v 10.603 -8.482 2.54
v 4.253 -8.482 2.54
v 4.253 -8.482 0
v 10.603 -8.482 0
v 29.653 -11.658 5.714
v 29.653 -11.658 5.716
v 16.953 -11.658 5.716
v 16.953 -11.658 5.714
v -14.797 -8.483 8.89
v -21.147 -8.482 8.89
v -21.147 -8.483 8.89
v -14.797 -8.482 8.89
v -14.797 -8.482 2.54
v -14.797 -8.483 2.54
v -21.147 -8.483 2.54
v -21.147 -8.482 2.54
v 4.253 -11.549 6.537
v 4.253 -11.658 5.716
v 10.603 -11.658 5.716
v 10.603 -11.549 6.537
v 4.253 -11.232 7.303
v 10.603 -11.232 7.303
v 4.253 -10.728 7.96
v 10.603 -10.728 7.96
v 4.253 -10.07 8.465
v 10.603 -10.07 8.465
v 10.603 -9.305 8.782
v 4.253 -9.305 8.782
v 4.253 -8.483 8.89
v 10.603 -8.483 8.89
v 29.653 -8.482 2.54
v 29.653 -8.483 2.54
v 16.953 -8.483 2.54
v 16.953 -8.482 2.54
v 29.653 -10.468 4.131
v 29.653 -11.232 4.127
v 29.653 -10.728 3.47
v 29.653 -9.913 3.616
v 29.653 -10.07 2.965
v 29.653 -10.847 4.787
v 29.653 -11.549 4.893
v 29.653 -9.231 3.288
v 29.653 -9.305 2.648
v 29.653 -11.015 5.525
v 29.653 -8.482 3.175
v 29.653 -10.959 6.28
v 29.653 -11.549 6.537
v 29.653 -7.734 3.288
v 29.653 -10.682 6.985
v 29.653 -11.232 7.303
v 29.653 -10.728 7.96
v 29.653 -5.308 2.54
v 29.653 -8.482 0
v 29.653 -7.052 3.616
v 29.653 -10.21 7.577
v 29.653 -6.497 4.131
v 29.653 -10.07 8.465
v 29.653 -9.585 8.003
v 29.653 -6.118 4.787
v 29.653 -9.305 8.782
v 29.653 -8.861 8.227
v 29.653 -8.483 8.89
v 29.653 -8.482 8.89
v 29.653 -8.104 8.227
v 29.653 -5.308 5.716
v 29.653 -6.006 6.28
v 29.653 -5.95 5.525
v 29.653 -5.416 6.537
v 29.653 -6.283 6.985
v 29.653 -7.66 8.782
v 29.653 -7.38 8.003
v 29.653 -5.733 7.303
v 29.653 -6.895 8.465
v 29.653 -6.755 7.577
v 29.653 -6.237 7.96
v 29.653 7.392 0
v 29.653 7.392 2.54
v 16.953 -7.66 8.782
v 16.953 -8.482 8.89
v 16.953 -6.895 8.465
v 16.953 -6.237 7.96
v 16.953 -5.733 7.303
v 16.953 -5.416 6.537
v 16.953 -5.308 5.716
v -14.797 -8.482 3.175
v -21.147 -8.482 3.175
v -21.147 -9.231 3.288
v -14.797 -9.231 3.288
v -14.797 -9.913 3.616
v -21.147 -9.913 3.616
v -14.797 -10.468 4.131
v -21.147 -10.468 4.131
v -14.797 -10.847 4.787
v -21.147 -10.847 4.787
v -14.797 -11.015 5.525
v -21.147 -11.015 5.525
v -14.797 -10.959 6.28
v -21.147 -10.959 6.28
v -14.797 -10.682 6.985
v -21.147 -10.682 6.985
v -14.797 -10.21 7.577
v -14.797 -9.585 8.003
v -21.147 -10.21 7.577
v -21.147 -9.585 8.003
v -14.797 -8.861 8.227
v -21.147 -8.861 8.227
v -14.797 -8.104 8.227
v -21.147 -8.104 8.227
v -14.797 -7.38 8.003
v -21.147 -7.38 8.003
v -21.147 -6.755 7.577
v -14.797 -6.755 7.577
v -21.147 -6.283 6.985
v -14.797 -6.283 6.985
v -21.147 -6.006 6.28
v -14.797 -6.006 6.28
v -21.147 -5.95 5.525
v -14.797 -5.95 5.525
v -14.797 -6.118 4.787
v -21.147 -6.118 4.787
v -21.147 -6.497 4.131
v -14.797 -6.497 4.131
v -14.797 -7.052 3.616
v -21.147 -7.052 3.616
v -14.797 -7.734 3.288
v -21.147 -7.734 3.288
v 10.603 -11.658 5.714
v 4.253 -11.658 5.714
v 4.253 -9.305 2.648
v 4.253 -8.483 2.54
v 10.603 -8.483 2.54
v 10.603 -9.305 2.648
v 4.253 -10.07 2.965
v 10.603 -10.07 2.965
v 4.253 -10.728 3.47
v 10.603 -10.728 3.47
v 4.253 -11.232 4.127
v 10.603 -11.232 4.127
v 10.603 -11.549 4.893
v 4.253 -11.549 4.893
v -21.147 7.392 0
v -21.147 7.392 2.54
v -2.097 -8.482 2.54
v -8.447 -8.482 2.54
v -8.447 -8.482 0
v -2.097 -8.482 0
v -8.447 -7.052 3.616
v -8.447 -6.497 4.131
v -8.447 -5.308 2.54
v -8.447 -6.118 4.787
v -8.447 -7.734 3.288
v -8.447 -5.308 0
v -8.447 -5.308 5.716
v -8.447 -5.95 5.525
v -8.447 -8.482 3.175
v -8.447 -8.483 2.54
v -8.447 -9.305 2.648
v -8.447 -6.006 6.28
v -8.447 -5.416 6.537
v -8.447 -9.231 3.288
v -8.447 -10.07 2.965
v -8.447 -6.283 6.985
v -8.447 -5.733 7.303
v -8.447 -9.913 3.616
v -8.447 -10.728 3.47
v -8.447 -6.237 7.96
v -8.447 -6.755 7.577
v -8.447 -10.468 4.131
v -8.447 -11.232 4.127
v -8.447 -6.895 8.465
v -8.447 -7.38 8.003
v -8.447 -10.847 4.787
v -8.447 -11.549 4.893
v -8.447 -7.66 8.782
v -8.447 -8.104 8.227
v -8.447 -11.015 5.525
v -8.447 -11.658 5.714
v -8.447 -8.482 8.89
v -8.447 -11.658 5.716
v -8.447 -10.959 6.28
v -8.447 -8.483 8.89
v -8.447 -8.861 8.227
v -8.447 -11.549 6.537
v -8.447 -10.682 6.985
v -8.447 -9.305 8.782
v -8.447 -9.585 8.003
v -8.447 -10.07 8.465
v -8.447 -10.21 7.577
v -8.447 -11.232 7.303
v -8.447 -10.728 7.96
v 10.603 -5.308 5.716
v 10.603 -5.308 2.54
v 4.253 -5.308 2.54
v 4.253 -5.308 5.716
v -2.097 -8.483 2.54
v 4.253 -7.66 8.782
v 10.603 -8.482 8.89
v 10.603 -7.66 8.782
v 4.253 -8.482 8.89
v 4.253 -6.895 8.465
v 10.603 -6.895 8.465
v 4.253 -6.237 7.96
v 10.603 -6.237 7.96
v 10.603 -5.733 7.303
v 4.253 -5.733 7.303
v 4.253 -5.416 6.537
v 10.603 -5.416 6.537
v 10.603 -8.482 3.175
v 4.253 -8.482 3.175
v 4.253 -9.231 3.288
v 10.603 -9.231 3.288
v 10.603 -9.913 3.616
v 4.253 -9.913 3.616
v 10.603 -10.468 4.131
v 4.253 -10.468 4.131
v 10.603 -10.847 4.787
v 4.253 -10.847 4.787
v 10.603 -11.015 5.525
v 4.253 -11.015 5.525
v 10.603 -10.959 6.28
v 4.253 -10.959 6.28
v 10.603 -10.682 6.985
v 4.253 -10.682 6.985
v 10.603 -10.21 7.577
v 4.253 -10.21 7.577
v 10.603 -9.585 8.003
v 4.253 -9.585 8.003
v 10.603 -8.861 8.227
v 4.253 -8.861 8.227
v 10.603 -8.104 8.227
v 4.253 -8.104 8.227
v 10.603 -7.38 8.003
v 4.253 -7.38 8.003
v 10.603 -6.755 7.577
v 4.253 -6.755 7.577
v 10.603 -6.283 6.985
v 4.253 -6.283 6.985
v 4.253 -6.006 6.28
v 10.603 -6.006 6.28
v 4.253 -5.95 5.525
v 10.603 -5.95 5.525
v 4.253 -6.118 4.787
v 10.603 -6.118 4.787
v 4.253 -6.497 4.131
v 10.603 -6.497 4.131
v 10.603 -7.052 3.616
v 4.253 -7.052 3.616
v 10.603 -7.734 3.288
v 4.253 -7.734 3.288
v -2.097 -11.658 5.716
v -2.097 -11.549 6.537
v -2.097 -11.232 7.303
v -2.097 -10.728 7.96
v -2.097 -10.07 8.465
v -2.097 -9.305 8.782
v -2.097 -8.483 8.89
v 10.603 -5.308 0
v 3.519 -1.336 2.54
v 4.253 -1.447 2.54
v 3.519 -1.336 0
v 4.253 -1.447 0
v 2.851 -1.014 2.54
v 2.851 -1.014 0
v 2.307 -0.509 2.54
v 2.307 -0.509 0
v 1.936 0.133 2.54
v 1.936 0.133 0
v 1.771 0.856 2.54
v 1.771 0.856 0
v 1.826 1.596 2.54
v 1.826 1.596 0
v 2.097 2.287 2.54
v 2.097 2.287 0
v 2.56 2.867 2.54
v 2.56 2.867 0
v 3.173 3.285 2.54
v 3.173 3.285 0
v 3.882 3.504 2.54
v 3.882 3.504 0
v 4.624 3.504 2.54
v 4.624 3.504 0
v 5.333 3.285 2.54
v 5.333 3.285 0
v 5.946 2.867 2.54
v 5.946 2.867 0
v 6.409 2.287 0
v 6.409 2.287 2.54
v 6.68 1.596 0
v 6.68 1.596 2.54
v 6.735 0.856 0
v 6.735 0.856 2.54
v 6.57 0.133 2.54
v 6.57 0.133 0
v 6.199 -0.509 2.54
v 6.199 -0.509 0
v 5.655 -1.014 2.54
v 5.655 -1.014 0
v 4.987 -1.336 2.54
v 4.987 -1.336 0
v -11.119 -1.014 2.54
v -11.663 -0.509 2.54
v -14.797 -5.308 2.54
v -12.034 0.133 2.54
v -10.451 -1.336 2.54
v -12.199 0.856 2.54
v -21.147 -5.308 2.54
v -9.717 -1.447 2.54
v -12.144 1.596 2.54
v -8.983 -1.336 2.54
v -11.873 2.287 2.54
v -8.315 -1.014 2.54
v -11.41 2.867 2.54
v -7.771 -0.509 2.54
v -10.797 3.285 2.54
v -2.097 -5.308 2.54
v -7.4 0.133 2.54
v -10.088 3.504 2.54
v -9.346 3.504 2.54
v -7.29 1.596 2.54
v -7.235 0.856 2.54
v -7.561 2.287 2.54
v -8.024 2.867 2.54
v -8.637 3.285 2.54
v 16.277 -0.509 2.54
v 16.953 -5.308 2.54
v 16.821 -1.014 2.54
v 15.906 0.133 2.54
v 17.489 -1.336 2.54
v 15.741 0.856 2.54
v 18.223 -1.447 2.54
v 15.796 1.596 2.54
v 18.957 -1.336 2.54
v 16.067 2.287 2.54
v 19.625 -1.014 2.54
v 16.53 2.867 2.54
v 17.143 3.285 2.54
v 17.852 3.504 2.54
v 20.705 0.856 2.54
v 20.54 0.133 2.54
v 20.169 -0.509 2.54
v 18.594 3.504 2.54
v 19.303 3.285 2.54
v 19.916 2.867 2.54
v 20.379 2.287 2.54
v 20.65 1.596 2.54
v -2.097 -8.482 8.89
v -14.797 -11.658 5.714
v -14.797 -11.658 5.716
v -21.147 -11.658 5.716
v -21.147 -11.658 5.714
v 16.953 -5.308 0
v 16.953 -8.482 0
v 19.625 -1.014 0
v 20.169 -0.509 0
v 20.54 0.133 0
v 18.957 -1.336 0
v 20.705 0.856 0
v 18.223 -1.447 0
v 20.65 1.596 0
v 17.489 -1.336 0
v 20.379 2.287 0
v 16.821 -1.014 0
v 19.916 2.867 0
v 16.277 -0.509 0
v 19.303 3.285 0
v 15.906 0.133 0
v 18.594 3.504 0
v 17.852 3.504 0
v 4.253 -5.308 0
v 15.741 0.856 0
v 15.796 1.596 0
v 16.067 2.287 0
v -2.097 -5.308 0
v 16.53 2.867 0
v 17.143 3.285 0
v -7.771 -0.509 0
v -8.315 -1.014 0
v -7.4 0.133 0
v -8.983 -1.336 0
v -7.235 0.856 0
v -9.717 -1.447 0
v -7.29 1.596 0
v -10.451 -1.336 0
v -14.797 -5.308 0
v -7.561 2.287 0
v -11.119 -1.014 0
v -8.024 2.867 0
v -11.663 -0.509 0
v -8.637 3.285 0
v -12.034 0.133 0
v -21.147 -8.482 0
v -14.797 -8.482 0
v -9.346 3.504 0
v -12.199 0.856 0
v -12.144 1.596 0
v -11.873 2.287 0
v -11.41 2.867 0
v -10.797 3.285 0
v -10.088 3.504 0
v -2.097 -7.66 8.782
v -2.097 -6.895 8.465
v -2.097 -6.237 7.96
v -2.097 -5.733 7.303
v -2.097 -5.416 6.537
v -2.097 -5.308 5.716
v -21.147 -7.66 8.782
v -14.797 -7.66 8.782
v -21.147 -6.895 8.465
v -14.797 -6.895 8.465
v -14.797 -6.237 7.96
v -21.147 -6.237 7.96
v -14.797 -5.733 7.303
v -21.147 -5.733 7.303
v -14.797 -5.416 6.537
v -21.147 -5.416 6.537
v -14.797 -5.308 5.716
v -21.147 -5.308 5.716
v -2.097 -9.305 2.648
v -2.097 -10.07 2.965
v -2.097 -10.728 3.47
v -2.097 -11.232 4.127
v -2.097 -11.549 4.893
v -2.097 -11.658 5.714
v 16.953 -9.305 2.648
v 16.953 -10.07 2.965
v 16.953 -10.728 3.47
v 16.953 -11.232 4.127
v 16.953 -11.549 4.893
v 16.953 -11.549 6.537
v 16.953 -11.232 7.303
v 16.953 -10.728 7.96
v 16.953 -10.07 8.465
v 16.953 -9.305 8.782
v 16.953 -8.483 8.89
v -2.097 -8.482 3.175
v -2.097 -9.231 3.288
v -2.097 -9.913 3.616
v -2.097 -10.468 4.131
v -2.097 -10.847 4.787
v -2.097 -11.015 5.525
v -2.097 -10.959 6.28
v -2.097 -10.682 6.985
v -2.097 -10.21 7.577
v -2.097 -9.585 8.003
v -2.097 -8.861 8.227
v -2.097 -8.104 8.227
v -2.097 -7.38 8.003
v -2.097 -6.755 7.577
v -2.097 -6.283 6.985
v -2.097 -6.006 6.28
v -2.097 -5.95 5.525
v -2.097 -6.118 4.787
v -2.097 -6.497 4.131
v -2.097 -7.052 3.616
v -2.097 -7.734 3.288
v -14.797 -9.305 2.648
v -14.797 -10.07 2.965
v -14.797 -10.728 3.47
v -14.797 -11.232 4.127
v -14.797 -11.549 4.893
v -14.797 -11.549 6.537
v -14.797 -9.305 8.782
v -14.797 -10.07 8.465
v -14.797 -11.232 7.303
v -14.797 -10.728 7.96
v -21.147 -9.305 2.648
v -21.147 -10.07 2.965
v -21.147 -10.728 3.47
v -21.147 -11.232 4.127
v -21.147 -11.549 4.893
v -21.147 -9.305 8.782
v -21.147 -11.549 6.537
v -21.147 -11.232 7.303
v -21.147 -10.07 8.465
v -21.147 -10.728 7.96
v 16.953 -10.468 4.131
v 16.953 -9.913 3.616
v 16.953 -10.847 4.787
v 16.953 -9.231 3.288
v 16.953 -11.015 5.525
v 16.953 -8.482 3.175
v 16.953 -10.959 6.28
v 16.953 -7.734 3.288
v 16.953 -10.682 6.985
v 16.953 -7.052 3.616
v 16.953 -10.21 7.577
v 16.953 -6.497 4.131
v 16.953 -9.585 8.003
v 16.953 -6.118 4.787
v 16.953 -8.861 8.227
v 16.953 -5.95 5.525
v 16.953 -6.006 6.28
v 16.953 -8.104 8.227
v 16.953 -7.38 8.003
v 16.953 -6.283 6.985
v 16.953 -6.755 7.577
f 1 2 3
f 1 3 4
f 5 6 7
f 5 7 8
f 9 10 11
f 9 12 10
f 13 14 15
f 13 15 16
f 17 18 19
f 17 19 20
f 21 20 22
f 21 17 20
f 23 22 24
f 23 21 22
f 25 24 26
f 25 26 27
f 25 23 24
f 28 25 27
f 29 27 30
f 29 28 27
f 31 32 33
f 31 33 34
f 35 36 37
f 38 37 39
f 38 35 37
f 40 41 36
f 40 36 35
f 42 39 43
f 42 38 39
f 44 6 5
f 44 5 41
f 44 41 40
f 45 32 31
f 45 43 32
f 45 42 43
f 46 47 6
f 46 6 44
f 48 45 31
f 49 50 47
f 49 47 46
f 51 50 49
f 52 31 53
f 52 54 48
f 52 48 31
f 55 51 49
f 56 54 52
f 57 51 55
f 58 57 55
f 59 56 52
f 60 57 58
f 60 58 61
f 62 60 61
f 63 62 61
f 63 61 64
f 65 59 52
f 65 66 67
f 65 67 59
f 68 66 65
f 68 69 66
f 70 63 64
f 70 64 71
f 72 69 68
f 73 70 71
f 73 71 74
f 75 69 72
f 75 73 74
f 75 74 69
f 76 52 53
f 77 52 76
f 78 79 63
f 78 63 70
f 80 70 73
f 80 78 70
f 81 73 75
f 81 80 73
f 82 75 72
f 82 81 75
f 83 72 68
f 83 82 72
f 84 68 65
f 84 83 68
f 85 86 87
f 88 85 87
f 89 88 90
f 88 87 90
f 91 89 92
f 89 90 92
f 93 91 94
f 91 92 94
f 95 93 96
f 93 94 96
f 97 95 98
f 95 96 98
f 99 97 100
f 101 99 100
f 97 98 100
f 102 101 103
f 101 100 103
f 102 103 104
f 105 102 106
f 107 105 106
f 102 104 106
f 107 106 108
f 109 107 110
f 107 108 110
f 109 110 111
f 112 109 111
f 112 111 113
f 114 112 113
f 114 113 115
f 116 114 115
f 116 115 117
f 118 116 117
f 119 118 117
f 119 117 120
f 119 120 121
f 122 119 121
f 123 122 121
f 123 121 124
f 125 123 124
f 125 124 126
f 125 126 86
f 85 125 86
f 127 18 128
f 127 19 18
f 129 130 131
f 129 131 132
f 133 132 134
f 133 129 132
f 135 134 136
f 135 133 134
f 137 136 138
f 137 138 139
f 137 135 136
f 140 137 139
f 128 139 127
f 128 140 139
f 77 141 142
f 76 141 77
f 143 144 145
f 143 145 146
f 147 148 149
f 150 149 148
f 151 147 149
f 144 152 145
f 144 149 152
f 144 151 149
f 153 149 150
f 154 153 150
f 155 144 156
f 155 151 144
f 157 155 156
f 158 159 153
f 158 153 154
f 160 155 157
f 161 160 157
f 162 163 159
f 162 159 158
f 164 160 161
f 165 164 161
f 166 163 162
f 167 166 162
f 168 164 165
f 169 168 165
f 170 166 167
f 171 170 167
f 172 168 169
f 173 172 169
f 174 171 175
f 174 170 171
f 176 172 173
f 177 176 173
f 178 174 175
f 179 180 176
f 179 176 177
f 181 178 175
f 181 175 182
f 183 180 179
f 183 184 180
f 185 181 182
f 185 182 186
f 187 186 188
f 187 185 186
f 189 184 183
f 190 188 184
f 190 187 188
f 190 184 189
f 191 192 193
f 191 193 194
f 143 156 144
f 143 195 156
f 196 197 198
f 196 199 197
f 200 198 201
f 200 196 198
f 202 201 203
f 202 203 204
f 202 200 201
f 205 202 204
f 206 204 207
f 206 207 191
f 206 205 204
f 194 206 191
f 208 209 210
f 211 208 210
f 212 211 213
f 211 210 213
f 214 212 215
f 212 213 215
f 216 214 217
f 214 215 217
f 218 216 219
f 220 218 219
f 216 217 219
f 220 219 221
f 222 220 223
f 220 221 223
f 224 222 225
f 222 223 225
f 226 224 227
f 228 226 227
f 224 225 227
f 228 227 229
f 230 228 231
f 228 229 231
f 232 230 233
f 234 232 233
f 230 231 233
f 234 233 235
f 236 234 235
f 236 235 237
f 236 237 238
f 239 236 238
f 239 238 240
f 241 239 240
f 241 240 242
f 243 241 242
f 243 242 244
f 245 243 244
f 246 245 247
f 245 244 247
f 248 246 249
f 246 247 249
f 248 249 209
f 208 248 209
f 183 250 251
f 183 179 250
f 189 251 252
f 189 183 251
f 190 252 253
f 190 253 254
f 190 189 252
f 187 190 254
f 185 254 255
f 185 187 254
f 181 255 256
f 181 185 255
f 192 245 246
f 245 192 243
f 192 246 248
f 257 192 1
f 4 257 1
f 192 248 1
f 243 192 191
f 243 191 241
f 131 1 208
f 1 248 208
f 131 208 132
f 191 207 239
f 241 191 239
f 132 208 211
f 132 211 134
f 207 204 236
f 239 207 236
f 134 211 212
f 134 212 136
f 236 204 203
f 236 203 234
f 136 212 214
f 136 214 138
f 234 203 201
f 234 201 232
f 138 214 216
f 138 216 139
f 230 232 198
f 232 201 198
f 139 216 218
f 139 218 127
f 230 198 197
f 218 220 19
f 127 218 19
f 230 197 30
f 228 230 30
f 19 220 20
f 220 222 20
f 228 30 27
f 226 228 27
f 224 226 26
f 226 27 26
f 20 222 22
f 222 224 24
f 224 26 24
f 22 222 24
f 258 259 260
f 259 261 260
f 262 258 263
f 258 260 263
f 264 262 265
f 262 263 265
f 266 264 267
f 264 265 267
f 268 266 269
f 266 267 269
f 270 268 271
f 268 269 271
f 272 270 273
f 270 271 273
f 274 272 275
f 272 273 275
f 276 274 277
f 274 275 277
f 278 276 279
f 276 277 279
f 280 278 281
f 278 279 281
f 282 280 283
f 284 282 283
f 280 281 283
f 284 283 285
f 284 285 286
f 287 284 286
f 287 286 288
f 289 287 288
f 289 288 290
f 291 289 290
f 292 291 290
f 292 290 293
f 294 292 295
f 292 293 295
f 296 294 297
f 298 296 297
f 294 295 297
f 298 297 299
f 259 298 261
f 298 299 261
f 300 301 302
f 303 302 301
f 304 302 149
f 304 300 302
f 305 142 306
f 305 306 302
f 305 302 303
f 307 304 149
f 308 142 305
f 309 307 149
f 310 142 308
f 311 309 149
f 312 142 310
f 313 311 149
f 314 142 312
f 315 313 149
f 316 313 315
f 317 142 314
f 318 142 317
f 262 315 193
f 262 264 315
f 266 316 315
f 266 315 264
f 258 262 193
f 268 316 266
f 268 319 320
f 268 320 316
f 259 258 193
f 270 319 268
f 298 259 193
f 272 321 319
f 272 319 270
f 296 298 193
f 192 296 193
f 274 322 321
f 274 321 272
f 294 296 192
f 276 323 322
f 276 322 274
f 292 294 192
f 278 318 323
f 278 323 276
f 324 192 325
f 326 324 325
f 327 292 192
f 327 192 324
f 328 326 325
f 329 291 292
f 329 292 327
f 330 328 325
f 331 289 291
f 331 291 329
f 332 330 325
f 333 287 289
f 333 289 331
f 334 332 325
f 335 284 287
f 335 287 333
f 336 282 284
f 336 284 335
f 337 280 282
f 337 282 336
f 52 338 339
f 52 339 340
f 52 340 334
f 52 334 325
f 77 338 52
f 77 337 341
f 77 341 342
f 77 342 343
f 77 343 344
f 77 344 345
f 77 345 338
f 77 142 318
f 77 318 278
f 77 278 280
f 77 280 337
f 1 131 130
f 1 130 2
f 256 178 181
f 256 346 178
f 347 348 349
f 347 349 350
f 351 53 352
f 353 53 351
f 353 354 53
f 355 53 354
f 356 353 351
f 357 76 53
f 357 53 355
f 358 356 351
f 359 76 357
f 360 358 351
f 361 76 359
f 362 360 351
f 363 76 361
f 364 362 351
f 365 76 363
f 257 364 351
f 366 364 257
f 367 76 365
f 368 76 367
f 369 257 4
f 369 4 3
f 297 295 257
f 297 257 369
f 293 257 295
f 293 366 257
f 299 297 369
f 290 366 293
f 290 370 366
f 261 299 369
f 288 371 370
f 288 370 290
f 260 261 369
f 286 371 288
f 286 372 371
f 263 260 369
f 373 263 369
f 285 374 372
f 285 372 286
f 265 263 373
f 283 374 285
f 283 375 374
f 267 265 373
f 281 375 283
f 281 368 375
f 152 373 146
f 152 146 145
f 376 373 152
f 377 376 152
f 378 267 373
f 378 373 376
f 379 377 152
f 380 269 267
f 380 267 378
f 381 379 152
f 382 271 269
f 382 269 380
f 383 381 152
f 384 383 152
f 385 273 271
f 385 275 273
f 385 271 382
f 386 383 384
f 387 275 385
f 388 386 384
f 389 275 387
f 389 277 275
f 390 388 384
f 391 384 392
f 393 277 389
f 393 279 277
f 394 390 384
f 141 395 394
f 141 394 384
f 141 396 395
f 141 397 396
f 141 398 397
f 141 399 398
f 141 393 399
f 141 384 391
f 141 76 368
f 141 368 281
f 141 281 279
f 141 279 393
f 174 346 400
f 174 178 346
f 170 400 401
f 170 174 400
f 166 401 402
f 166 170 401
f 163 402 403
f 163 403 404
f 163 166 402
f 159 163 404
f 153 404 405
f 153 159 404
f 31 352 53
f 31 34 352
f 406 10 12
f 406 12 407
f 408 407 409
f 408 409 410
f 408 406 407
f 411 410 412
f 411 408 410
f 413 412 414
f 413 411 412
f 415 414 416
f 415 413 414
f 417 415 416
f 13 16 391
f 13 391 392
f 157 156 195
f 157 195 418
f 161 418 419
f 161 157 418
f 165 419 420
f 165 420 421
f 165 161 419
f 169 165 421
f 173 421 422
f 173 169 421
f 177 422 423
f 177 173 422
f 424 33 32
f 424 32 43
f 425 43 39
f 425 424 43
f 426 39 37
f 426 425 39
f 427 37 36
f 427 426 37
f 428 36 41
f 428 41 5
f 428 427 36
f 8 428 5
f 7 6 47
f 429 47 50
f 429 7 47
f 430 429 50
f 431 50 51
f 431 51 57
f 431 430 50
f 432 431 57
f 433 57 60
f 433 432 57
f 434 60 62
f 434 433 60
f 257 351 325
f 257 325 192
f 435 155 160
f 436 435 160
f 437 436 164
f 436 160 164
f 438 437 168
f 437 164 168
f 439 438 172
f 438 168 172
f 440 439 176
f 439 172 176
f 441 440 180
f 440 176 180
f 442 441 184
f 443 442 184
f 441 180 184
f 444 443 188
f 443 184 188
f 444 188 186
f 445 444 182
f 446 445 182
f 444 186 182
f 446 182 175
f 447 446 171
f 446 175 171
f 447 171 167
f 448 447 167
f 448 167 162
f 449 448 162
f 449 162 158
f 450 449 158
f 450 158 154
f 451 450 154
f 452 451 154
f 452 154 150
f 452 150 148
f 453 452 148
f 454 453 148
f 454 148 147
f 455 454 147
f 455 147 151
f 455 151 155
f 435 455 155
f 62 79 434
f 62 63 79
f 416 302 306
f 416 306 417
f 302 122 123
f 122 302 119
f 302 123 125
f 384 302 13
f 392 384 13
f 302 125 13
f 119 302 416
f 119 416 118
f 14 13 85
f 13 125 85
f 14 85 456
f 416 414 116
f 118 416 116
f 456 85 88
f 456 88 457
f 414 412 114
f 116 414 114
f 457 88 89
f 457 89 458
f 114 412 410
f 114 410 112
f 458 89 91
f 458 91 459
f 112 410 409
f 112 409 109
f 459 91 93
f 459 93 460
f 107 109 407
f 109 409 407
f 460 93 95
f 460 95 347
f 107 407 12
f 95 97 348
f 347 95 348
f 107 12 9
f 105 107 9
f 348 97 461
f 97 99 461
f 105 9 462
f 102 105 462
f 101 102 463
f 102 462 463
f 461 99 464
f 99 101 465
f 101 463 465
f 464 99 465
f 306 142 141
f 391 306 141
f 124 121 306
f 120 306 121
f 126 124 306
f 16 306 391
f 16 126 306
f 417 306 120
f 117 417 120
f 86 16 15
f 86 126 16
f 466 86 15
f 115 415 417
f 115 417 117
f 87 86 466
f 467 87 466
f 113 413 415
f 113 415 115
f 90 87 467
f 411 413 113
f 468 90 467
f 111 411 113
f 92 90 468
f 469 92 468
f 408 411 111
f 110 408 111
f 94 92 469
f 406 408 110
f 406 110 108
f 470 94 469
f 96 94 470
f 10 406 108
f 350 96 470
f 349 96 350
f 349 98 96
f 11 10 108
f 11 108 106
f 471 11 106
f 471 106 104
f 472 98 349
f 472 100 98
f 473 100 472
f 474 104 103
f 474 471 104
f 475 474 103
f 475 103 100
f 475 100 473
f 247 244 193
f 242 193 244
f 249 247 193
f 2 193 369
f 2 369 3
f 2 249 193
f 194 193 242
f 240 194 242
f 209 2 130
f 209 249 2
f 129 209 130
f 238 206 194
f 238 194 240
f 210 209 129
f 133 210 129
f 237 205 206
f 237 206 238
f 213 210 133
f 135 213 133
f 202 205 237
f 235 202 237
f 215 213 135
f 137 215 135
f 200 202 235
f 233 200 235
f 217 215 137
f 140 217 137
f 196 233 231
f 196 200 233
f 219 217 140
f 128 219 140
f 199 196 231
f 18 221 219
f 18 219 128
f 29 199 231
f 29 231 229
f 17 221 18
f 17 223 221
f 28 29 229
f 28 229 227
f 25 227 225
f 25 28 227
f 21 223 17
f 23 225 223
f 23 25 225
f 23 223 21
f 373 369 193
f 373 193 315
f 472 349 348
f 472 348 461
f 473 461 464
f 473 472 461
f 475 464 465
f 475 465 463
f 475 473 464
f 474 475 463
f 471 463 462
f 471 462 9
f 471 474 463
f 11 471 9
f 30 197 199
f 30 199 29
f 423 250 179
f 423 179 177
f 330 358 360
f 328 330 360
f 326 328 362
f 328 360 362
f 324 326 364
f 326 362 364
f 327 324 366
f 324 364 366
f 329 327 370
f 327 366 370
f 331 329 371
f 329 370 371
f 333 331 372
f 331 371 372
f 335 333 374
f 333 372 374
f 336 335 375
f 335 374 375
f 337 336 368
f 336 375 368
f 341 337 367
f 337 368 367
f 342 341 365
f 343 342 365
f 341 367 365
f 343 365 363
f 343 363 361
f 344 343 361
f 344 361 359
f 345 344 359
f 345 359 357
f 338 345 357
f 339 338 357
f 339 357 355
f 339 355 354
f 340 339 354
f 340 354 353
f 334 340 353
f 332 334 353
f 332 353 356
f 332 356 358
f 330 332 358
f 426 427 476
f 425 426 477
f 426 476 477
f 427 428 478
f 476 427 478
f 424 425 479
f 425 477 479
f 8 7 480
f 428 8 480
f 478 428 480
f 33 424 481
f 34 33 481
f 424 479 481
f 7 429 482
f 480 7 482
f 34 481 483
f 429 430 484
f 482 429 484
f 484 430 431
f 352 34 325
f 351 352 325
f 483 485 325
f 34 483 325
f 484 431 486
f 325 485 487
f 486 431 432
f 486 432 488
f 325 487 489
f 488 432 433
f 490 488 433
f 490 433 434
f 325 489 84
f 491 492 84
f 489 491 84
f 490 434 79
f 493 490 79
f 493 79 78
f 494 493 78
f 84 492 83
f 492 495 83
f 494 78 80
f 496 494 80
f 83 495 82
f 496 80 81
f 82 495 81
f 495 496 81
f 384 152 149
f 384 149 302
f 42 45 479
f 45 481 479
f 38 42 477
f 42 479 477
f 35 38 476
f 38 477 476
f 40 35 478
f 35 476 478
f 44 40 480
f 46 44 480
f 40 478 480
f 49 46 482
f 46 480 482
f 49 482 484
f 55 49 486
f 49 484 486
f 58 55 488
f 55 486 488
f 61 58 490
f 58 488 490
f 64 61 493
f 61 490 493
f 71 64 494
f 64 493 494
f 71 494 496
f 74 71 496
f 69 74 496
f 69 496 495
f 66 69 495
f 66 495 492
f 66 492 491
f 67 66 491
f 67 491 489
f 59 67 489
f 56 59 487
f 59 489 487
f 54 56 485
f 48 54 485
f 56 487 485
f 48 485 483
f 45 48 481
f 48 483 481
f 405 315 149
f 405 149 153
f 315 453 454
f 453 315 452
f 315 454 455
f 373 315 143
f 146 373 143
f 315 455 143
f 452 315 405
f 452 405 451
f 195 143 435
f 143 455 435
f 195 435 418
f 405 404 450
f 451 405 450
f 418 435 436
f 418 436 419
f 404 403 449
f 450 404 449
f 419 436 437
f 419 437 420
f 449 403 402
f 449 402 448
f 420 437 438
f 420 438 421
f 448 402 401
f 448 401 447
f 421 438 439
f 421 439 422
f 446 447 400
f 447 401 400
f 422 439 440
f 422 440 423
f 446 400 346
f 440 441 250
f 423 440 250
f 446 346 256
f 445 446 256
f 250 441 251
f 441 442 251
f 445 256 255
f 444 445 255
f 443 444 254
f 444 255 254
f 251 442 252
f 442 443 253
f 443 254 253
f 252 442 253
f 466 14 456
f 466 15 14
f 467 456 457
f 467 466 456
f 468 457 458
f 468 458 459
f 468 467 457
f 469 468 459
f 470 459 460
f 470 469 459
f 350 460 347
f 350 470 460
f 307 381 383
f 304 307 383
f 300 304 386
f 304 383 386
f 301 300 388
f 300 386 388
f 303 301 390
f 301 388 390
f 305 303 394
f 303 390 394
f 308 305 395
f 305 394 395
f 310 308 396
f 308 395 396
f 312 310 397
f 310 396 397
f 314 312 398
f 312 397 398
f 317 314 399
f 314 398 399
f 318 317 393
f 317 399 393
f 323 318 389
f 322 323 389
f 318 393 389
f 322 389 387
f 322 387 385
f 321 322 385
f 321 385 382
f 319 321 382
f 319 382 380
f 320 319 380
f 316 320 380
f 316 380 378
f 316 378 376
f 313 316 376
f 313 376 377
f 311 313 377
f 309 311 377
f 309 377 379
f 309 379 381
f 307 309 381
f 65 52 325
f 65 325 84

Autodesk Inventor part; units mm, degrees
ref_plane "YZ Plane" through (0, 0, 0) normal (1, 0, 0) x (0, 1, 0)
ref_plane "XZ Plane" through (0, 0, 0) normal (0, 1, 0) x (-1, 0, 0)
ref_plane "XY Plane" through (0, 0, 0) normal (0, 0, 1) x (1, 0, 0)
sketch "Sketch1" plane through (0, 0, 0) normal (0, 0, 1) x (1, 0, 0)
  line L0 (-21.147, 7.3925) -> (29.653, 7.3925)
  line L1 (29.653, 7.3925) -> (29.653, -5.3075)
  line L2 (29.653, -5.3075) -> (-21.147, -5.3075)
  line L3 (-21.147, -5.3075) -> (-21.147, 7.3925)
  point P0 (0, 0)
  dimension "d0" = 50.8
  dimension "d1" = 12.7
extrude "Extrusion1" add sketch "Sketch1" along normal blind 2.54
sketch "Sketch3" plane through (29.653, -5.3075, 0) normal (1, 0, 0) x (0, 0, -1)
  line L0 (-2.54, 0) -> (-8.89, 0)
  line L1 (-8.89, 0) -> (-8.89, -6.35)
  line L2 (-8.89, -6.35) -> (-2.54, -6.35)
  line L3 (-2.54, -6.35) -> (-2.54, 0)
  point P0 (0, 5.3075)
  dimension "d9" = 6.35
  dimension "d10" = 6.35
extrude "Extrusion2" add sketch "Sketch3" against normal blind 50.8
fillet "Fillet1" radius 3.175 3 edges at (4.253, -5.3075, 8.89) (4.253, -11.6575, 8.89) (4.253, -11.6575, 2.54)
hole "Hole1" at (29.653, -8.4825, 5.715) direction (-1, 0, 0) diameter 5.08 end through all
sketch "Sketch4" plane through (-21.147, -5.3075, 2.54) normal (0, 1, 0) x (1, 0, 0)
  line L0 (50.8, 0) -> (0, 0) projected
  line L1 (0, 0) -> (0, -3.175) projected
  line L2 (6.35, 0) -> (12.7, 0)
  line L3 (12.7, 0) -> (12.7, -6.6787)
  line L4 (12.7, -6.6787) -> (6.35, -6.6787)
  line L5 (6.35, -6.6787) -> (6.35, 0)
  line L6 (19.05, 0) -> (25.4, 0)
  line L7 (25.4, 0) -> (25.4, -6.6787)
  line L8 (25.4, -6.6787) -> (19.05, -6.6787)
  line L9 (19.05, -6.6787) -> (19.05, 0)
  line L10 (31.75, 0) -> (38.1, 0)
  line L11 (38.1, 0) -> (38.1, -6.6787)
  line L12 (38.1, -6.6787) -> (31.75, -6.6787)
  line L13 (31.75, -6.6787) -> (31.75, 0)
  point P0 (21.147, 2.54)
  dimension "d23" = 6.35
  dimension "d24" = 6.35
  dimension "d25" = 6.35
  dimension "d26" = 6.35
  dimension "d27" = 6.35
  dimension "d28" = 6.35
extrude "Extrusion3" cut sketch "Sketch4" against normal blind 12.7
hole "Hole2" at (-9.717, 1.0425, 2.54) direction (0, 0, -1) diameter 4.9784 end through all thread size "1/4-20 UNC" class "2B" standard "ANSI Unified Screw Threads"
hole "Hole3" at (18.223, 1.0425, 2.54) direction (0, 0, -1) diameter 4.9784 end through all thread size "1/4-20 UNC" class "2B" standard "ANSI Unified Screw Threads"
hole "Hole4" at (4.253, 1.0425, 2.54) direction (0, 0, -1) diameter 4.9784 end through all thread size "1/4-20 UNC" class "2B" standard "ANSI Unified Screw Threads"
sketch "Sketch5" plane through (29.653, -8.4825, 2.54) normal (0, 0, -1) x (-1, 0, 0)
  line L0 (12.7, 0) -> (12.7, 3.175) projected
  line L1 (0, 3.175) -> (12.7, 3.175) projected
  line L2 (0, 3.175) -> (12.7, 3.175)
  line L3 (12.7, 3.175) -> (12.7, 0)
  line L4 (12.7, 0) -> (0, 0)
  line L5 (0, 0) -> (0, 3.175)
  point P0 (29.653, 8.4825)
sketch "Sketch6" plane through (10.603, -8.4825, 2.54) normal (0, 0, -1) x (-1, 0, 0)
  line L0 (0, 3.175) -> (0, 0) projected
  line L1 (6.35, 0) -> (0, 0) projected
  line L2 (0, 3.175) -> (6.35, 3.175)
  line L3 (6.35, 3.175) -> (6.35, 0)
  line L4 (6.35, 0) -> (0, 0)
  line L5 (0, 0) -> (0, 3.175)
  point P0 (10.603, 8.4825)
sketch "Sketch7" plane through (-2.097, -8.4825, 2.54) normal (0, 0, -1) x (-1, 0, 0)
  line L0 (0, 3.175) -> (0, 0) projected
  line L1 (6.35, 0) -> (0, 0) projected
  line L2 (0, 3.175) -> (6.35, 3.175)
  line L3 (6.35, 3.175) -> (6.35, 0)
  line L4 (6.35, 0) -> (0, 0)
  line L5 (0, 0) -> (0, 3.175)
  point P0 (-2.097, 8.4825)
sketch "Sketch8" plane through (-21.147, -8.4825, 2.54) normal (0, 0, -1) x (-1, 0, 0)
  line L0 (-6.35, 3.175) -> (-6.35, 0) projected
  line L1 (0, 0) -> (-6.35, 0) projected
  line L2 (-6.35, 3.175) -> (0, 3.175)
  line L3 (0, 3.175) -> (0, 0)
  line L4 (0, 0) -> (-6.35, 0)
  line L5 (-6.35, 0) -> (-6.35, 3.175)
  point P0 (-21.147, 8.4825)
extrude "Extrusion4" add sketch "Sketch5" along normal blind 2.54
extrude "Extrusion5" add sketch "Sketch6" along normal blind 2.54
extrude "Extrusion6" add sketch "Sketch7" along normal blind 2.54
extrude "Extrusion7" add sketch "Sketch8" along normal blind 2.54
properties part number "HingeP1"
